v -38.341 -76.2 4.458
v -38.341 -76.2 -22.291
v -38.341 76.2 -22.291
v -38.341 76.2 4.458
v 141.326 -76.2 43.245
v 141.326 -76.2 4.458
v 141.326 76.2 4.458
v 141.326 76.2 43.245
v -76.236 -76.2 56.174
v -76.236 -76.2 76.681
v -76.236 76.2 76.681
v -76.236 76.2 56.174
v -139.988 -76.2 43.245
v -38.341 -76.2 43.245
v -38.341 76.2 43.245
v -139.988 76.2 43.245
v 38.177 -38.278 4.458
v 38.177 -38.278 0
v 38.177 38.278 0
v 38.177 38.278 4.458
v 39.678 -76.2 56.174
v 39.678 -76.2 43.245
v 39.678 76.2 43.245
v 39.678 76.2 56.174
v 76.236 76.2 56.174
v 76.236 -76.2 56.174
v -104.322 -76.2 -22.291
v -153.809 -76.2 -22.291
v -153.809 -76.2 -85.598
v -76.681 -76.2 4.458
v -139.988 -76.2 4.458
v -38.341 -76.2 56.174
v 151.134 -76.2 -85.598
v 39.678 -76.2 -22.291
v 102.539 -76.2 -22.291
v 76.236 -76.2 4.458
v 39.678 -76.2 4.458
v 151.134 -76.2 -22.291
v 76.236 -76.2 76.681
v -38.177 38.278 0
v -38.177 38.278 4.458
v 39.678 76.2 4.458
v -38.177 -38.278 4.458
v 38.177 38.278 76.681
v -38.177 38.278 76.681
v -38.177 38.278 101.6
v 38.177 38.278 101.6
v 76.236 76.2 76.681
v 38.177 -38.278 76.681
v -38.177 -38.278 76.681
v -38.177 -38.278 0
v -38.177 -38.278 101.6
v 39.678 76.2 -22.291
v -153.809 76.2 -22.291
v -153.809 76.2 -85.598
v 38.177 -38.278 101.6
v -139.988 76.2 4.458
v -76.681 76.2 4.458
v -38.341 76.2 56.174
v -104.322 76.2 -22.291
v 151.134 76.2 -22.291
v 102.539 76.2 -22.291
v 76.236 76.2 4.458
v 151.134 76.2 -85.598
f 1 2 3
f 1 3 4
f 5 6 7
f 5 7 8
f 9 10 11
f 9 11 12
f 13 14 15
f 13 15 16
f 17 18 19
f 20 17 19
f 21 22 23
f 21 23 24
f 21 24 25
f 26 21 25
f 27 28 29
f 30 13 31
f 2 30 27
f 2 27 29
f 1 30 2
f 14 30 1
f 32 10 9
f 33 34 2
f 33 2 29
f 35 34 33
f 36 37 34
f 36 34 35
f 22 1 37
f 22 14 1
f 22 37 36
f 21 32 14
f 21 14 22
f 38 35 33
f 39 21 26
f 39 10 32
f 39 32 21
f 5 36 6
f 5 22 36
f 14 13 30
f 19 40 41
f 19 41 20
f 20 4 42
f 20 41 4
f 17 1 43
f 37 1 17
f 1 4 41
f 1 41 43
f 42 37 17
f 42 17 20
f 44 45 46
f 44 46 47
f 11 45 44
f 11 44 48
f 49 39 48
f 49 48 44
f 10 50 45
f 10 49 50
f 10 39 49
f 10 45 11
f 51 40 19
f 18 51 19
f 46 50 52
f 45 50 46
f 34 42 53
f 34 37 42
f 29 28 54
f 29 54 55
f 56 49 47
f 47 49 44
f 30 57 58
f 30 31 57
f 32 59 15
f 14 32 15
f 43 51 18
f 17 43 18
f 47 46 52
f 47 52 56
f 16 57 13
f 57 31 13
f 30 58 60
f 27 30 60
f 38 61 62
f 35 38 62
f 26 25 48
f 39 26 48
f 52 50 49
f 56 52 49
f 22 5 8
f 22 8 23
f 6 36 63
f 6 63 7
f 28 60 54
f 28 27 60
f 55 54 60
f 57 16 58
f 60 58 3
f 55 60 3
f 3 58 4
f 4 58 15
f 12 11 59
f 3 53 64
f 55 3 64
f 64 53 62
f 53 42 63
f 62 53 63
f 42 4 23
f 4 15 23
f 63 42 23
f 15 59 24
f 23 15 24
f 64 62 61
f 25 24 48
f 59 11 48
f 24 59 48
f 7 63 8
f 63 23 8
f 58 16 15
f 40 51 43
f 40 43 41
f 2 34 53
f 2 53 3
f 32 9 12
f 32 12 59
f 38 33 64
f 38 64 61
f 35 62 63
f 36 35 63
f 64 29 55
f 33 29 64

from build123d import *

# Parameters (mm, degrees)
F0_W     = 63.306741
F0_H     = 38.786522
F0_W_2   = 65.090016
F1_DEPTH = 76.2
F2_W     = 76.3532
F2_H     = 76.556332
F3_DEPTH = 101.6


with BuildPart() as f1:
    # F0 (on Front) → F1 (new body, symmetric)
    with BuildSketch(Plane.XZ):
        Polygon((-153.808624, -22.291109), (-153.808624, -85.597843), (151.133701, -85.597843), (151.133701, -22.291109), (102.539085, -22.291109), (39.678164, -22.291109), (-38.340699, -22.291109), (-104.322366, -22.291109), align=None)
        Polygon((-76.681398, 4.458224), (-104.322366, -22.291109), (-38.340699, -22.291109), (-38.340699, 4.458224), align=None)
        Polygon((39.678164, -22.291109), (102.539085, -22.291109), (76.235577, 4.458224), (39.678164, 4.458224), align=None)
        Polygon((-76.681398, 43.244746), (-76.681398, 4.458224), (-38.340699, 4.458224), (0, 4.458224), (0, 43.244746), (-38.340699, 43.244746), align=None)
        with Locations((-108.334768, 23.851485)):
            Rectangle(F0_W, F0_H)
        with Locations((108.780585, 23.851485)):
            Rectangle(F0_W_2, F0_H)
        Polygon((39.678164, 4.458224), (76.235577, 4.458224), (76.235577, 43.244746), (39.678164, 43.244746), (0, 43.244746), (0, 4.458224), align=None)
        Polygon((-38.340699, 56.173585), (-38.340699, 43.244746), (0, 43.244746), (39.678164, 43.244746), (39.678164, 56.173585), align=None)
        Polygon((-76.235577, 56.173585), (-38.340699, 56.173585), (39.678164, 56.173585), (76.235577, 56.173585), (76.235577, 76.681405), (-76.235577, 76.681405), align=None)
    extrude(amount=F1_DEPTH, both=True)

    # F2 (on Top) → F3 (join)
    with BuildSketch(Plane.XY):
        Rectangle(F2_W, F2_H)
    extrude(amount=F3_DEPTH)


solid = f1.part
